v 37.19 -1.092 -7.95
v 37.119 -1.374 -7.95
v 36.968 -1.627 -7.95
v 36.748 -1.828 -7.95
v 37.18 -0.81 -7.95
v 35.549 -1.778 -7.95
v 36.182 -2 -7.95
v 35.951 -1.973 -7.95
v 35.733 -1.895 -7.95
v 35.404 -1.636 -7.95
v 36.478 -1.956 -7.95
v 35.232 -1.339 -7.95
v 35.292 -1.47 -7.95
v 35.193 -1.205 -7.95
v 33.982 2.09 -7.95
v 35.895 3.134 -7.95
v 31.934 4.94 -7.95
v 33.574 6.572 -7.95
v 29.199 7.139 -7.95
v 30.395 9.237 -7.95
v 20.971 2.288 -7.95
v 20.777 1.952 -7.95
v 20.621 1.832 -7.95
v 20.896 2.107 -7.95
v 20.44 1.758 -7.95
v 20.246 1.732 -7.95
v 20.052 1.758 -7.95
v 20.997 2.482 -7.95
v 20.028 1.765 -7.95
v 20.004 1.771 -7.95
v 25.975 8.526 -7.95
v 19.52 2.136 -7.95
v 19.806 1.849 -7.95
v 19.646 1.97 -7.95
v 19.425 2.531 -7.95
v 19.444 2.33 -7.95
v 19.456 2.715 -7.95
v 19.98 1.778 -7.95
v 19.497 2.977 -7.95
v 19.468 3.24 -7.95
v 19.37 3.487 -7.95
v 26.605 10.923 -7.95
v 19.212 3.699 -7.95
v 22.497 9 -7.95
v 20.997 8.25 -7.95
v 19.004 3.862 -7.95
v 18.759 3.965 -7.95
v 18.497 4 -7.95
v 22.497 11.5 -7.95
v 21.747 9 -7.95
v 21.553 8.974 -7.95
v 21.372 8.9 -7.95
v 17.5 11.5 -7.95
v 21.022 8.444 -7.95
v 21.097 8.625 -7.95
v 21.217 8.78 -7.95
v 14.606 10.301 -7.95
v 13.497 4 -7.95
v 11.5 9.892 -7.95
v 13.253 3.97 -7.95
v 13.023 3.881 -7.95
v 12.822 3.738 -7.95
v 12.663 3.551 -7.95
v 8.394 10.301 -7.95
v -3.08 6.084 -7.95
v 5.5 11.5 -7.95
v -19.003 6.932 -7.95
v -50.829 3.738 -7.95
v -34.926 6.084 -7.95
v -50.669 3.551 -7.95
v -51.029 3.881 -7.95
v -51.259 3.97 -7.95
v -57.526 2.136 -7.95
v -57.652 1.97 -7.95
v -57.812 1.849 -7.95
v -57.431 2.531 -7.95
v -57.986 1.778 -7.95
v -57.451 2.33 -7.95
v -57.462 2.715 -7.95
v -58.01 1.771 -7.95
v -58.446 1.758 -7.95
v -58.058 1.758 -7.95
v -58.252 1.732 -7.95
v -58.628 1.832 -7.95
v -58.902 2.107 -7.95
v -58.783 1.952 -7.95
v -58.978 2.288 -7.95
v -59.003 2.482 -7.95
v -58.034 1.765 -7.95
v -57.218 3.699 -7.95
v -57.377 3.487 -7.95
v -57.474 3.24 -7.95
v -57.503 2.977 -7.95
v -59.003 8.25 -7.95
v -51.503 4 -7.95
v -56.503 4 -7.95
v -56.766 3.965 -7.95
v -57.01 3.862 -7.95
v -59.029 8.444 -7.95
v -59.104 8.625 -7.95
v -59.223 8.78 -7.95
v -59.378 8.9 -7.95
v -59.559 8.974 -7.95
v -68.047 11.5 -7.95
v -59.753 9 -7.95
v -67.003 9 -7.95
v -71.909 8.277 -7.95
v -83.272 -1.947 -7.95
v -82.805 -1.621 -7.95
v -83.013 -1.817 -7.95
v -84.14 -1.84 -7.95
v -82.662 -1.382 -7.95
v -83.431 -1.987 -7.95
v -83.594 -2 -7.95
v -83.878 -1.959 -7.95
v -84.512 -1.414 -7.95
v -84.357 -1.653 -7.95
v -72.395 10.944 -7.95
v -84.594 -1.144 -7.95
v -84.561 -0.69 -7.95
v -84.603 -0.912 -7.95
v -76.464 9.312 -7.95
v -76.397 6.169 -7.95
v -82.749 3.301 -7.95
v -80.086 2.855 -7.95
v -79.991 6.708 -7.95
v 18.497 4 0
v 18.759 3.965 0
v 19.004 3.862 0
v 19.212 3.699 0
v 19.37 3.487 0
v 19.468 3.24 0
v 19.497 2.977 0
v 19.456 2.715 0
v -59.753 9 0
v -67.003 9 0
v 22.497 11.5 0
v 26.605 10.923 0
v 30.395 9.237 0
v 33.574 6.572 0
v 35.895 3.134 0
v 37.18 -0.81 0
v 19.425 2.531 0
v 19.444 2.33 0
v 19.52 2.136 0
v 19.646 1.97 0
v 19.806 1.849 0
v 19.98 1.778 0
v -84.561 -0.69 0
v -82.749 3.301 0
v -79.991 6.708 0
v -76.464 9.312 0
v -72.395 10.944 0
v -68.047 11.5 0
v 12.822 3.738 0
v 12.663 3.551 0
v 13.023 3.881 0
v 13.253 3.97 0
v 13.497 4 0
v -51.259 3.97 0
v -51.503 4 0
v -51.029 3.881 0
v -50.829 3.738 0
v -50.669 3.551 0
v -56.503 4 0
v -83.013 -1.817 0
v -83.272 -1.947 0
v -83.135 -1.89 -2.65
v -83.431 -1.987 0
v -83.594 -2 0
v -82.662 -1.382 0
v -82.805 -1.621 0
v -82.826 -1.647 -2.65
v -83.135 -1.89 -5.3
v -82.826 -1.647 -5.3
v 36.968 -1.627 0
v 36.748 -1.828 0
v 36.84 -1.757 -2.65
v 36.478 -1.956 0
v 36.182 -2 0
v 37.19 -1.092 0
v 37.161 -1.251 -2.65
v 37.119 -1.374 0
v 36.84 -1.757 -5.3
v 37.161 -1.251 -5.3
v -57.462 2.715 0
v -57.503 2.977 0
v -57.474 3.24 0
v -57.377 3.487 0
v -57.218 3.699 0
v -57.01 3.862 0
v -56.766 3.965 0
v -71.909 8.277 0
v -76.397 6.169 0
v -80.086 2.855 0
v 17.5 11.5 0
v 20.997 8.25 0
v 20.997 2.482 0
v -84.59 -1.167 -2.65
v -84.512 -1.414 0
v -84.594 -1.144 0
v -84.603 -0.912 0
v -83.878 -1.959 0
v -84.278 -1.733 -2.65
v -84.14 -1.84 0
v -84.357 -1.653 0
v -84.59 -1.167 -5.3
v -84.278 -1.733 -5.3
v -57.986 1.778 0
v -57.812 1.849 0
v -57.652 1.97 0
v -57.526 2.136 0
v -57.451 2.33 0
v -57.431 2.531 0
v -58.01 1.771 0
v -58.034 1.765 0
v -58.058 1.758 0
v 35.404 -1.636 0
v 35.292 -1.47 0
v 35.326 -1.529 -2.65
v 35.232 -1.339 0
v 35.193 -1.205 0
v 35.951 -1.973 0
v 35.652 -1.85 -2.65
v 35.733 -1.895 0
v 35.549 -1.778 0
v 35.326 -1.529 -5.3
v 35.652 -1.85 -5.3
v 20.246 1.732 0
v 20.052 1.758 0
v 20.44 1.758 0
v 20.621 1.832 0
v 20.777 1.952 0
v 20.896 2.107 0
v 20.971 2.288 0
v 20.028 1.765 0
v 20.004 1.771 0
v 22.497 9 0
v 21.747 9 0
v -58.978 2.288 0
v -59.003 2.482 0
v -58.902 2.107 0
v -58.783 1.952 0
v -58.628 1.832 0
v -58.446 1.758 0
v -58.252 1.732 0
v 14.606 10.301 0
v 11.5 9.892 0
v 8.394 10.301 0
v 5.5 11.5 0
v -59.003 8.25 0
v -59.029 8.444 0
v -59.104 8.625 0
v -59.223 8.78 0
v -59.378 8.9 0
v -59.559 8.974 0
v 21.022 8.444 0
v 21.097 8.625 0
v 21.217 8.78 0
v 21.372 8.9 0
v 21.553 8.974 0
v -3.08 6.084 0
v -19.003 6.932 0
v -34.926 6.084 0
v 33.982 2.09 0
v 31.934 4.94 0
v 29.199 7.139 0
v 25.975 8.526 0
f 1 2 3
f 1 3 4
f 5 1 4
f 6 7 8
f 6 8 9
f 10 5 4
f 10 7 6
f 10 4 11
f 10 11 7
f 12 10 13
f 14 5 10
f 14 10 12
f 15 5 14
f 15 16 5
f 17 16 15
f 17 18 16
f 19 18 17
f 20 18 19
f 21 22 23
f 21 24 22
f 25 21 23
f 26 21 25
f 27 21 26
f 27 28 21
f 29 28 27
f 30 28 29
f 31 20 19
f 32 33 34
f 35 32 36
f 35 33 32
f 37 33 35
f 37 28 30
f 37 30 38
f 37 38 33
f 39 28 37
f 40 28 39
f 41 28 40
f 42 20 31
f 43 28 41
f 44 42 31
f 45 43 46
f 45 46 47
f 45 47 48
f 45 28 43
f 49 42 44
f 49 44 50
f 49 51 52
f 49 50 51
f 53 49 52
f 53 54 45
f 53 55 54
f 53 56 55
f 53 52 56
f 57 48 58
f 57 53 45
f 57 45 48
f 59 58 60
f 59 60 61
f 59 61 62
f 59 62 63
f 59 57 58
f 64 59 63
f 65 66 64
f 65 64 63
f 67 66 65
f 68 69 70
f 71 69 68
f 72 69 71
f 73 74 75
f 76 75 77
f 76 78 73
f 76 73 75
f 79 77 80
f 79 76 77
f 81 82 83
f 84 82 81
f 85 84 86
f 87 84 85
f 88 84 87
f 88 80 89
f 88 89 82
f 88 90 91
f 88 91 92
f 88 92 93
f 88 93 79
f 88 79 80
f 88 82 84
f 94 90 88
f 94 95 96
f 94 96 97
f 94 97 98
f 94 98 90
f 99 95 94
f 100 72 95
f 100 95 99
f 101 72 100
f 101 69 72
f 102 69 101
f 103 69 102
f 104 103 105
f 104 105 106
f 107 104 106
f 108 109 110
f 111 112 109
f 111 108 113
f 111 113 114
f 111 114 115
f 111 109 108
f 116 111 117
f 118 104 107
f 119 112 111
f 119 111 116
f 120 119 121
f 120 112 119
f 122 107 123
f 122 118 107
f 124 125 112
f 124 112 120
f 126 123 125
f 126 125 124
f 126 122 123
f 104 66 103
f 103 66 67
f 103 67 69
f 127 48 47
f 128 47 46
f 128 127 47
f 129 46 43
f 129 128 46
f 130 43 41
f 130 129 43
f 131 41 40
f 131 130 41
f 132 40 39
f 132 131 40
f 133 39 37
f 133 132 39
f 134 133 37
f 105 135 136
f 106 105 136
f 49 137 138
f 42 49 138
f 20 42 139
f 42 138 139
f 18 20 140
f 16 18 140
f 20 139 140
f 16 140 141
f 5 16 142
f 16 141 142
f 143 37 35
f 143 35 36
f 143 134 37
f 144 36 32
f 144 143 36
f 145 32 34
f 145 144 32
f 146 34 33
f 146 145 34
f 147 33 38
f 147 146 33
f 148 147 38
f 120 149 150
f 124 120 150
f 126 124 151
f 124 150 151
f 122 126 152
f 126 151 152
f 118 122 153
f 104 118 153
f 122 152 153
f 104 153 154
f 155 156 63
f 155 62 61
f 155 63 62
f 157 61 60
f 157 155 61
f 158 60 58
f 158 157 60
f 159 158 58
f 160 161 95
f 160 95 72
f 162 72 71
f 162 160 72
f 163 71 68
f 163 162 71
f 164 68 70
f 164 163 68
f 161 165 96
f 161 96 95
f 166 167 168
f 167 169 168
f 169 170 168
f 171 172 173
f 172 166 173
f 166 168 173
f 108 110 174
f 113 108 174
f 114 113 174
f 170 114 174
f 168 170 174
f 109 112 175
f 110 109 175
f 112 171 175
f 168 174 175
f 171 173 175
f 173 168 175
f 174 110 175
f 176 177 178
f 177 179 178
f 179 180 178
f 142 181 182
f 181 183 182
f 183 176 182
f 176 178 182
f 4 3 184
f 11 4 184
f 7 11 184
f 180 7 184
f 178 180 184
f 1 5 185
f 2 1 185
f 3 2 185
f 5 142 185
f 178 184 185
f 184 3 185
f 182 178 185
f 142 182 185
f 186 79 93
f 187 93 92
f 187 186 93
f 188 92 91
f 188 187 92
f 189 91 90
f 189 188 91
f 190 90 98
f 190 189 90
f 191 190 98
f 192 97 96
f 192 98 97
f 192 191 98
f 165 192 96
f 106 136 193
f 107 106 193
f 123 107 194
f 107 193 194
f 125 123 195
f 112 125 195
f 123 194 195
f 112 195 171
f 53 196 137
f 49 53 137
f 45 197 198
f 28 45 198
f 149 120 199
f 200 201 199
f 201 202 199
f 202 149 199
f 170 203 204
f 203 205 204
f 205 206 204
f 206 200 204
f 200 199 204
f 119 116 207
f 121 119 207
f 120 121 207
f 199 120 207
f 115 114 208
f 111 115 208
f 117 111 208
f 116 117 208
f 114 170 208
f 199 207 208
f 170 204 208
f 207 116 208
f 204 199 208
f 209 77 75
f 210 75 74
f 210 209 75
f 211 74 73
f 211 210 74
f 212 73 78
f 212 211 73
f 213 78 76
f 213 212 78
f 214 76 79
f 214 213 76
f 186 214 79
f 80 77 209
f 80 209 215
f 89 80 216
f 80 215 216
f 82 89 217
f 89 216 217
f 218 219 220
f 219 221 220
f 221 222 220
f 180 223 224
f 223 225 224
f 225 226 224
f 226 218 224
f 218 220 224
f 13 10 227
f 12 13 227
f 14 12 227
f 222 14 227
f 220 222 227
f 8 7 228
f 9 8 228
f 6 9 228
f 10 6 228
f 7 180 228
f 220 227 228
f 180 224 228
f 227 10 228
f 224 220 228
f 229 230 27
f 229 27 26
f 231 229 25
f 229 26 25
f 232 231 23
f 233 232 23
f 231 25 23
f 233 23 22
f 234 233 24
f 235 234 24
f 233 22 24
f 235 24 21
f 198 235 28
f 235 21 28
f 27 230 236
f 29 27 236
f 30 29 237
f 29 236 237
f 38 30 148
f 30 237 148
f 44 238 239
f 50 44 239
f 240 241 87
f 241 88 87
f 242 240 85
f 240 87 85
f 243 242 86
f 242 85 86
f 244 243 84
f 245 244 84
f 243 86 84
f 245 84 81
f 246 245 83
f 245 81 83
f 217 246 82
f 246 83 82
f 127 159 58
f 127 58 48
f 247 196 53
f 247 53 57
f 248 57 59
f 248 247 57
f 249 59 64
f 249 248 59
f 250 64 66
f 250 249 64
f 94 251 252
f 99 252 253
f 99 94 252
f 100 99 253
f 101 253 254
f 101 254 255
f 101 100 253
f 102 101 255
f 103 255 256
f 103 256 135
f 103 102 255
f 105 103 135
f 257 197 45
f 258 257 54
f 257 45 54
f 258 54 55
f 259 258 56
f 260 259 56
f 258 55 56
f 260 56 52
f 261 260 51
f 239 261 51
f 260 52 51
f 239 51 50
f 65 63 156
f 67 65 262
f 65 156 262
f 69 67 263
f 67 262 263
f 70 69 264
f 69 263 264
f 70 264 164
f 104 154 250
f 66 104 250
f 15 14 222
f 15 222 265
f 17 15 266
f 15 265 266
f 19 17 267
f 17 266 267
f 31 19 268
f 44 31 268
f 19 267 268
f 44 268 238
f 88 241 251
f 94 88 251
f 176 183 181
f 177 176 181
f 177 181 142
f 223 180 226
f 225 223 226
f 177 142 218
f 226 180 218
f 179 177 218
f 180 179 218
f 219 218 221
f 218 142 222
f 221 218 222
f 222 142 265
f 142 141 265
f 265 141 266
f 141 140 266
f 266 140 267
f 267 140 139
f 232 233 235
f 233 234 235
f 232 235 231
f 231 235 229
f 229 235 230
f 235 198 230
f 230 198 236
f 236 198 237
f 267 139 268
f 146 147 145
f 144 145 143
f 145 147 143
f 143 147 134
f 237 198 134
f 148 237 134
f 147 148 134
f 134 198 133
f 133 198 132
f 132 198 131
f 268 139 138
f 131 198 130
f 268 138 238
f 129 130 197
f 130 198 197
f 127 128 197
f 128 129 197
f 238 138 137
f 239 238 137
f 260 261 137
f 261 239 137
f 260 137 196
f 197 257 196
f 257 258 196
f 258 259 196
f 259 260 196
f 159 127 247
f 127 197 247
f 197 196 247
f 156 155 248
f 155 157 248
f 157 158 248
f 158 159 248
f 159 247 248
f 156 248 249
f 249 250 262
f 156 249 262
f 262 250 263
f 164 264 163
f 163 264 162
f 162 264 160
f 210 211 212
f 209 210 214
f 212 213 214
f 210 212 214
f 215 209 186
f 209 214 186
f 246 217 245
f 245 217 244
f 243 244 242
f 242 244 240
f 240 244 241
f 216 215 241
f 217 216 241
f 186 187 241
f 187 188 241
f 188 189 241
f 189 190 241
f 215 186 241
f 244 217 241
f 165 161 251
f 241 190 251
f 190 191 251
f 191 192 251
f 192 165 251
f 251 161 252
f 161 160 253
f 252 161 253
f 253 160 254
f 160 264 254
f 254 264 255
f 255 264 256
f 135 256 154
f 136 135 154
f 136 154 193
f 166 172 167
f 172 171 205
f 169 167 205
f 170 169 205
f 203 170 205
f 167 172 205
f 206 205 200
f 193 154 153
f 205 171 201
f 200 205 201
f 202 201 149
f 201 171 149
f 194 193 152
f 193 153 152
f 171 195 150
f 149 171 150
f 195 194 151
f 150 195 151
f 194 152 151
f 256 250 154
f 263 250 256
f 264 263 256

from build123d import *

# Parameters (mm, degrees)
EXTRUDE_1210_DEPTH     = 7.95
CUT_EXTRUDE_1739_DEPTH = 87.052353761
FILLET_1_R             = 0.75
CUT_EXTRUDE_3017_DEPTH = 87.052353882
FILLET_START           = -9
FILLET_2_DEPTH         = 10
FILLET_3_DEPTH         = 10


with BuildPart() as part:
    # Эскиз1 → Extrude 1210 (new body)
    with BuildSketch(Plane.XY):
        with BuildLine():
            Line((-59.003125249, 1.5), (-59.003125249, 9))
            Line((-59.003125249, 9), (-67.003125249, 9))
            ThreePointArc((-67.003125249, 9), (-76.672665052, 5.982131454), (-82.909098969, -2))
            Line((-82.909098969, -2), (-84.909098969, -2))
            ThreePointArc((-84.909098969, -2), (-78.847334249, 7.709212734), (-68.047161318, 11.5))
            Line((-68.047161318, 11.5), (0, 11.5))
            Line((0, 11.5), (22.496874751, 11.5))
            ThreePointArc((22.496874751, 11.5), (32.529707481, 7.620316306), (37.34210733, -2))
            Line((37.34210733, -2), (35.34210733, -2))
            ThreePointArc((35.34210733, -2), (30.952642014, 5.874208829), (22.496874751, 9))
            Line((22.496874751, 9), (20.996874751, 9))
            Line((20.996874751, 9), (20.996874751, 1.5))
            ThreePointArc((20.996874751, 1.5), (-19.003125249, 6.931677052), (-59.003125249, 1.5))
        make_face()
    extrude(amount=-EXTRUDE_1210_DEPTH)

    # Эскиз5 → Cut-Extrude 1739 (cut, through all)
    with BuildSketch(Plane.XY):
        with BuildLine():
            Line((-56.503125249, 4), (-51.503125249, 4))
            ThreePointArc((-51.503125249, 4), (-50.503125249, 3), (-51.503125249, 2))
            Line((-51.503125249, 2), (-56.503125249, 2))
            ThreePointArc((-56.503125249, 2), (-57.503125249, 3), (-56.503125249, 4))
        make_face()
        with BuildLine():
            Line((18.496874751, 2), (13.496874751, 2))
            ThreePointArc((13.496874751, 2), (12.496874751, 3), (13.496874751, 4))
            Line((13.496874751, 4), (18.496874751, 4))
            ThreePointArc((18.496874751, 4), (19.496874751, 3), (18.496874751, 2))
        make_face()
    extrude(amount=-CUT_EXTRUDE_1739_DEPTH, mode=Mode.SUBTRACT)

    # Скругление1
    fillet_1_edges = [part.edges().sort_by_distance(p)[0] for p in [
        (-59.003125249, 1.5, -3.975),
        (-59.003125249, 9, -3.975),
        (20.996874751, 9, -3.975),
        (20.996874751, 1.5, -3.975),
        (-56.87546785, 2.071904645, -3.975),
        (18.869217353, 2.071904645, -3.975),
    ]]
    fillet(fillet_1_edges, radius=FILLET_1_R)

    # Эскиз3 → Cut-Extrude 3017 (cut, through all)
    with BuildSketch(Plane.XY):
        with BuildLine():
            Line((5.5, 11.5), (17.5, 11.5))
            ThreePointArc((17.5, 11.5), (11.5, 9.892304845), (5.5, 11.5))
        make_face()
    extrude(amount=-CUT_EXTRUDE_3017_DEPTH, mode=Mode.SUBTRACT)

    # Скругление2: read off the stored shape, not the designer's step
    # Скругление2 outline → Скругление2 (cut)
    with BuildSketch(Plane.XY.offset(FILLET_START)):
        with BuildLine():
            add(Edge.make_bspline(
                [(-83.594065856, -1.999999999), (-83.128693054, -2), (-82.805959239, -1.722499415), (-82.662093068, -1.382090449)],
                knots=[0.592824962, 0.592824962, 0.592824962, 0.592824962, 1, 1, 1, 1], degree=3, weights=[0.541566314, 0.5894209, 0.742232129, 1]))
            Line((-83.594065856, -1.999999999), (-82.909098969, -2))
            ThreePointArc((-82.909098969, -2), (-82.78861975, -1.689836505), (-82.662093068, -1.382090449))
        make_face()
        with BuildLine():
            add(Edge.make_bspline(
                [(-84.560958648, -0.690168037), (-84.749276161, -1.301091768), (-84.44037433, -1.999999997), (-83.594065856, -1.999999999)],
                knots=[0, 0, 0, 0, 0.592824962, 0.592824962, 0.592824962, 0.592824962], degree=3, weights=[1, 0.624703839, 0.47189261, 0.541566314]))
            ThreePointArc((-84.560958648, -0.690168037), (-84.747874965, -1.341669638), (-84.909098969, -2))
            Line((-84.909098969, -2), (-83.594065856, -1.999999999))
        make_face()
    extrude(amount=FILLET_2_DEPTH, mode=Mode.SUBTRACT)

    # Скругление3: read off the stored shape, not the designer's step
    # Скругление3 outline → Скругление3 (cut)
    with BuildSketch(Plane.XY.offset(FILLET_START)):
        with BuildLine():
            add(Edge.make_bspline(
                [(36.182438008, -1.999999999), (36.957978226, -1.999999999), (37.281497294, -1.380826049), (37.180278652, -0.809748442)],
                knots=[0.449797355, 0.449797355, 0.449797355, 0.449797355, 1, 1, 1, 1], degree=3, weights=[0.515263178, 0.479194979, 0.64077392, 1]))
            Line((36.182438008, -1.999999999), (37.34210733, -2))
            ThreePointArc((37.34210733, -2), (37.273182402, -1.40324412), (37.180278652, -0.809748442))
        make_face()
        with BuildLine():
            add(Edge.make_bspline(
                [(35.192752533, -1.204523772), (35.28524719, -1.624595617), (35.624720765, -1.999999999), (36.182438008, -1.999999999)],
                knots=[0, 0, 0, 0, 0.449797355, 0.449797355, 0.449797355, 0.449797355], degree=3, weights=[1, 0.70632831, 0.544749369, 0.515263178]))
            ThreePointArc((35.192752533, -1.204523772), (35.273622194, -1.601099256), (35.34210733, -2))
            Line((35.34210733, -2), (36.182438008, -1.999999999))
        make_face()
    extrude(amount=FILLET_3_DEPTH, mode=Mode.SUBTRACT)


solid = part.part
